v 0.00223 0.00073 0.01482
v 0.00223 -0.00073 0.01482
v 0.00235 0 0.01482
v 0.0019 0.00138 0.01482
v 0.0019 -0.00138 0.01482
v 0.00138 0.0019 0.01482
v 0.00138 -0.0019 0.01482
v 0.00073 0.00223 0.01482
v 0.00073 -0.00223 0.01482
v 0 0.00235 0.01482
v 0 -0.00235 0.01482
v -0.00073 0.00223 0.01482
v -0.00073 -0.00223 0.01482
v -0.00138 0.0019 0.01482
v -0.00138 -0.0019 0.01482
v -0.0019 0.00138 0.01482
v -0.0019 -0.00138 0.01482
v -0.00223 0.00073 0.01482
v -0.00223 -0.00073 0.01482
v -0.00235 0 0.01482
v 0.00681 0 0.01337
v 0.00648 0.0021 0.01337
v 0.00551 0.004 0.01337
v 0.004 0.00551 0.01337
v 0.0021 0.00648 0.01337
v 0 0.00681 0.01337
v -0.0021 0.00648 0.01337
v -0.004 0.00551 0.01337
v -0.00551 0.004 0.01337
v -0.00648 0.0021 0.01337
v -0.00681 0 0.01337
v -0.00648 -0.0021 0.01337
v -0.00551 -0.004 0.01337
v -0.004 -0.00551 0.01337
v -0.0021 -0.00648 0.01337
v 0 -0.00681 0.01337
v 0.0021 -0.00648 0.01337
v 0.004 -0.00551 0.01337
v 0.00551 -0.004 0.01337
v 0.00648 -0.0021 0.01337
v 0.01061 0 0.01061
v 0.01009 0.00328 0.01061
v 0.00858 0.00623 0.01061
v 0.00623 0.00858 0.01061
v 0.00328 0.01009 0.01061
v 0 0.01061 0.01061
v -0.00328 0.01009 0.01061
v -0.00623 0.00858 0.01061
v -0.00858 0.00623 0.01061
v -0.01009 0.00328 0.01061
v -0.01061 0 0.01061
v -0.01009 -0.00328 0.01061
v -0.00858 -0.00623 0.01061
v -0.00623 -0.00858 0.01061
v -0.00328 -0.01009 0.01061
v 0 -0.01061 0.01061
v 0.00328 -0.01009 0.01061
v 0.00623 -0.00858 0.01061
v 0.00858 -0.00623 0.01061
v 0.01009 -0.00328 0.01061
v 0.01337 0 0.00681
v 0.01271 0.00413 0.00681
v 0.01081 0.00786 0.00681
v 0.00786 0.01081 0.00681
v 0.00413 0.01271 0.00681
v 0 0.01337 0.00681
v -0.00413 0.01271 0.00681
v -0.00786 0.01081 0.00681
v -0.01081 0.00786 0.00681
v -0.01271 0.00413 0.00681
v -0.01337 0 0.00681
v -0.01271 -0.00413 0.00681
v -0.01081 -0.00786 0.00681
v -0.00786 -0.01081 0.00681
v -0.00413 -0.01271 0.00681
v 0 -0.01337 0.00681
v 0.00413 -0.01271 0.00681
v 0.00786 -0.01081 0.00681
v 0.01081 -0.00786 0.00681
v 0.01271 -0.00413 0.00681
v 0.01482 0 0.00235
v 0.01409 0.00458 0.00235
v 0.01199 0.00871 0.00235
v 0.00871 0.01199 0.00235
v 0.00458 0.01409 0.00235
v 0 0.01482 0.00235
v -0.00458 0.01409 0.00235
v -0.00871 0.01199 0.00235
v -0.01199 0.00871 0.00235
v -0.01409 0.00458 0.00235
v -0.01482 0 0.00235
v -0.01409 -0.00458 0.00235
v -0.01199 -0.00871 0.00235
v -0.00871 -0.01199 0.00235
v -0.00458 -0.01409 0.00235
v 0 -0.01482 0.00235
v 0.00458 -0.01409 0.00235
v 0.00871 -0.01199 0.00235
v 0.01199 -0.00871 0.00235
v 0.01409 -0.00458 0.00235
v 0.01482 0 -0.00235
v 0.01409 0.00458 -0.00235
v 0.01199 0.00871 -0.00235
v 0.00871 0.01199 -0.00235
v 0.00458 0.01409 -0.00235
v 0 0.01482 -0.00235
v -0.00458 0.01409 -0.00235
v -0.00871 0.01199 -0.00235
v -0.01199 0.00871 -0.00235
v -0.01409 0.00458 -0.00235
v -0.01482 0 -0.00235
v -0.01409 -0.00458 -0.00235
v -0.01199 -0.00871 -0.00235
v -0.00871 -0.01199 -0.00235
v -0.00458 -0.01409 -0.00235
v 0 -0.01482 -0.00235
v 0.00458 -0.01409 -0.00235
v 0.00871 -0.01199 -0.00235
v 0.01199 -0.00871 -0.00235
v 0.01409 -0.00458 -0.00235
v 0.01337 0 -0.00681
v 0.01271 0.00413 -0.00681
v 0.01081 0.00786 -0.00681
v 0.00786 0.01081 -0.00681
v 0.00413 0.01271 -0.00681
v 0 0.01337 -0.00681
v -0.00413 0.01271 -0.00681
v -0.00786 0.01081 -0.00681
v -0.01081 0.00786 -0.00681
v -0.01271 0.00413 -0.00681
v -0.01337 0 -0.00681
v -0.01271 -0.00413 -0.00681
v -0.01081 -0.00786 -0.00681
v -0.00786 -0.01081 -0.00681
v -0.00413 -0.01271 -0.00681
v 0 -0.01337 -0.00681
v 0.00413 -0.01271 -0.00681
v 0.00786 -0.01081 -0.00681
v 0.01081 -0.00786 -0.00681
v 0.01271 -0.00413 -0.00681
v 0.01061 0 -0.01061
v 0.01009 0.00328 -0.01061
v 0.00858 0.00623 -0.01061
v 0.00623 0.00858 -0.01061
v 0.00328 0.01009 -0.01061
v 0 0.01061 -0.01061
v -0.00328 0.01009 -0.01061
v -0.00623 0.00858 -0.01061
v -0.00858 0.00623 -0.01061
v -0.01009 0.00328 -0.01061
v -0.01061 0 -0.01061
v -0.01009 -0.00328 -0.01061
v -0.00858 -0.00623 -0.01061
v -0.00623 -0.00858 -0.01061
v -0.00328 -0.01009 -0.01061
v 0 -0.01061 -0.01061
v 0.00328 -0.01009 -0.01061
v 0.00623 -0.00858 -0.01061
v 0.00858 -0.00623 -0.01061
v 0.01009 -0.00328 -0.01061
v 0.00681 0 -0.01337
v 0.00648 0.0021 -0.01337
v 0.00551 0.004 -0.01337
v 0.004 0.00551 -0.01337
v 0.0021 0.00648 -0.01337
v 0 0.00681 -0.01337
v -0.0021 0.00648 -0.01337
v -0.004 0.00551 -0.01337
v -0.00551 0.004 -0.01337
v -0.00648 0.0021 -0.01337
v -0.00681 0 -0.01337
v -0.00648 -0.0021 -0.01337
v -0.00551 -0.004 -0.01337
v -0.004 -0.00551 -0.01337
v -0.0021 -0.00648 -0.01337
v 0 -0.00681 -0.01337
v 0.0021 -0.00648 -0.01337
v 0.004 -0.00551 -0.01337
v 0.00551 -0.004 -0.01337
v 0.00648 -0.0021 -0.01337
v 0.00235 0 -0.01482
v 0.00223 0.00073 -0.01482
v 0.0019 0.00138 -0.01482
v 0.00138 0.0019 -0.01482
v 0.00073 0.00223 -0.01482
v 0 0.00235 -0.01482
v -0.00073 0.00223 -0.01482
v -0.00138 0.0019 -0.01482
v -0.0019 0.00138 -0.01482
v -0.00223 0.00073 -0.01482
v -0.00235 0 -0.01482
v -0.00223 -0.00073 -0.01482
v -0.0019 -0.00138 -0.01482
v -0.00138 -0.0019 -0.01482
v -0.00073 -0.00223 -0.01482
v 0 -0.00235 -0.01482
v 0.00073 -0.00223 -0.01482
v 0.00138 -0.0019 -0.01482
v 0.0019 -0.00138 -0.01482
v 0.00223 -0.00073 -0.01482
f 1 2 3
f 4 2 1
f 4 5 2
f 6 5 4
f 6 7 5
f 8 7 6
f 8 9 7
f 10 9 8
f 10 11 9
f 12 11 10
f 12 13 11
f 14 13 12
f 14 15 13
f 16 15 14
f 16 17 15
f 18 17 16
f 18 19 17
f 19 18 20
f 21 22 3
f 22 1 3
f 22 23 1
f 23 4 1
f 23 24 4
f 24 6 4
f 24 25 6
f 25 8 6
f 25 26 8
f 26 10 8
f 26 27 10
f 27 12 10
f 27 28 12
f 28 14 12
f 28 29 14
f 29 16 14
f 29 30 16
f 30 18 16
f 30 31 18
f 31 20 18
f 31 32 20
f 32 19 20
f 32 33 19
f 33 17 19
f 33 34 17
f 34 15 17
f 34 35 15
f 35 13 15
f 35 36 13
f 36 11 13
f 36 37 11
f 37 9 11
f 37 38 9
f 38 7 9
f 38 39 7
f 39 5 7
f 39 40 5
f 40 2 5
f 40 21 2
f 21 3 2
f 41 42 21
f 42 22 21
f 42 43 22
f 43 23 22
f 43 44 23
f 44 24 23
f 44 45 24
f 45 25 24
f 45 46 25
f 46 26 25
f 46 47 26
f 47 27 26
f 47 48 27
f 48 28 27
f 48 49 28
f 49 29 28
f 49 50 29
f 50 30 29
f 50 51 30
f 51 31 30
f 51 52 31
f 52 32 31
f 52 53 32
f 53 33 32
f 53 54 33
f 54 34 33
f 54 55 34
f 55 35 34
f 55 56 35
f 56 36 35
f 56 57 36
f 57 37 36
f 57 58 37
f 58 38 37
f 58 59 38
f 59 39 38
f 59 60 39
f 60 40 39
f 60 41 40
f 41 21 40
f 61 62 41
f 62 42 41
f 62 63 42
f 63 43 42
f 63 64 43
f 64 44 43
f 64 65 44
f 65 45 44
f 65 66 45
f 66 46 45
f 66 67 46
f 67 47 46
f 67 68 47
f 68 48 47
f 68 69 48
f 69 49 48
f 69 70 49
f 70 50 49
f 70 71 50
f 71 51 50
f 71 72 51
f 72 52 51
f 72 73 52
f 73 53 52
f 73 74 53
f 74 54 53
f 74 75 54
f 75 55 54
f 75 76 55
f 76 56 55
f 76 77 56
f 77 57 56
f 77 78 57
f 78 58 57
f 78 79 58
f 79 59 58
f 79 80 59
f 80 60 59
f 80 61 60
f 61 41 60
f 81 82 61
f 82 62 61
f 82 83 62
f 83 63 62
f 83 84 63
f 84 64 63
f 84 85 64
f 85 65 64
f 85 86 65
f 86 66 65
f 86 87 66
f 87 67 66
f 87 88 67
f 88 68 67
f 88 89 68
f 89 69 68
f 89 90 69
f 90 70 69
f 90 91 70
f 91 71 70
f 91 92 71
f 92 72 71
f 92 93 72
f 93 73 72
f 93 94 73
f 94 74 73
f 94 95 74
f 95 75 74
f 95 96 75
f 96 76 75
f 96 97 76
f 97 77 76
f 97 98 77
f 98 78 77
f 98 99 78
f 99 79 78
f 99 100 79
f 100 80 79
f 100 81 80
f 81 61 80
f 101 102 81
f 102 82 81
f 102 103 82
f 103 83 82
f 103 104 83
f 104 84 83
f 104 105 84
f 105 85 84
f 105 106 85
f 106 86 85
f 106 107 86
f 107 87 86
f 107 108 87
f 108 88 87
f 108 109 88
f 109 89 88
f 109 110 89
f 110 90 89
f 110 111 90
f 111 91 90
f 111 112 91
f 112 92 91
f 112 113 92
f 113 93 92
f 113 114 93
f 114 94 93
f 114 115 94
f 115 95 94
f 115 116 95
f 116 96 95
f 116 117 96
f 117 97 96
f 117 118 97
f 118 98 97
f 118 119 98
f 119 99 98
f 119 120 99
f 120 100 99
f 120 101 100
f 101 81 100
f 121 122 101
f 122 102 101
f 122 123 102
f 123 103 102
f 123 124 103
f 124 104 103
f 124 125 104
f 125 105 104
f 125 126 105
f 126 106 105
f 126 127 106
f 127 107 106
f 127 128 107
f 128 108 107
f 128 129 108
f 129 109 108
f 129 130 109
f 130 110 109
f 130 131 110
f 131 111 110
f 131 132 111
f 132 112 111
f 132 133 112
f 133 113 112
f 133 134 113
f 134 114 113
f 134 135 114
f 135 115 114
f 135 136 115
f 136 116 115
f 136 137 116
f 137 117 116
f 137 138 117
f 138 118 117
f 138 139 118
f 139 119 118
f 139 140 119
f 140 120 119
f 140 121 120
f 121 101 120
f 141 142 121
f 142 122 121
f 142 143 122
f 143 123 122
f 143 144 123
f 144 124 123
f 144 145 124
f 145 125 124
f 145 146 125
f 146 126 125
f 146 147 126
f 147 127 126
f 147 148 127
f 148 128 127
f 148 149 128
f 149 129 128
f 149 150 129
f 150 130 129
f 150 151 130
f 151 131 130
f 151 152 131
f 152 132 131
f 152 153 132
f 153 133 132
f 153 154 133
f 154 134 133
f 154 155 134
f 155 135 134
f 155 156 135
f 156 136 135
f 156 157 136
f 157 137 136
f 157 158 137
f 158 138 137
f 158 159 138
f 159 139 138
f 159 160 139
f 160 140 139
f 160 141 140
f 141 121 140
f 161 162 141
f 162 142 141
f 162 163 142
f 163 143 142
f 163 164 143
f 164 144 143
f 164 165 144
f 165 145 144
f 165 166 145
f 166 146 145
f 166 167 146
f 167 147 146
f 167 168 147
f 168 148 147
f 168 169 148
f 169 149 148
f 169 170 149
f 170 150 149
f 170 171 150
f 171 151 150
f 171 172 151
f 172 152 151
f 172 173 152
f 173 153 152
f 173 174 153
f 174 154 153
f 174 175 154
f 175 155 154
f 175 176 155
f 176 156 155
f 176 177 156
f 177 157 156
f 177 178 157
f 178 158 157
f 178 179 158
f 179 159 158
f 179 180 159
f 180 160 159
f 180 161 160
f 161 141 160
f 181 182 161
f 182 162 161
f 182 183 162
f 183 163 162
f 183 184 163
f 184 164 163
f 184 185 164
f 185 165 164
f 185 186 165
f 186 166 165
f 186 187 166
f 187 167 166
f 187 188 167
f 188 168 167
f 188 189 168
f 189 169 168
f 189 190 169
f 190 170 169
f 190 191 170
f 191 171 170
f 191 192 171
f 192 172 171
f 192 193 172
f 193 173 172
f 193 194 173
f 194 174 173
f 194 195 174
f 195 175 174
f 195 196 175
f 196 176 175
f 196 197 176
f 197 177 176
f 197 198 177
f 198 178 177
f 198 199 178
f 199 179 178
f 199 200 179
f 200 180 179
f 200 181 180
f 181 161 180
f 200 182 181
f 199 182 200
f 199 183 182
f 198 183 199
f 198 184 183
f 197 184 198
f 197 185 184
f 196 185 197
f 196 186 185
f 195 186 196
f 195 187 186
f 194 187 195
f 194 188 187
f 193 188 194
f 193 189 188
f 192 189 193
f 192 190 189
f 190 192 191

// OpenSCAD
// Auto-generated extrusion assembly
$fn = 20;


module extrusion_2020(length) {
  // 20mm x 20mm extrusion, colored faces
  translate([0, 0, length/2])
  difference() {
    cube([0.02, 0.02, length], center=true);
    // Hollow out slightly for visual effect
    cube([0.016, 0.016, length+0.001], center=true);
  }
}

module colored_extrusion(start, end, white_dir) {
  // Calculate direction and length
  dir = end - start;
  len = norm(dir);
  
  // Calculate rotation to align Z with direction
  if (len > 0.001) {
    translate(start)
    multmatrix(m=look_at(dir, white_dir))
    extrusion_2020(len);
  }
}

// Look-at matrix helper
function look_at(dir, up) = 
  let(
    z = dir / norm(dir),
    x = cross(up, z) / norm(cross(up, z)),
    y = cross(z, x)
  )
  [[x[0], y[0], z[0], 0],
   [x[1], y[1], z[1], 0],
   [x[2], y[2], z[2], 0],
   [0, 0, 0, 1]];


module connector(pos) {
  translate(pos)
  color([0.3, 0.3, 0.3])
  sphere(r=0.015);
}

connector([0.000000, 0.000000, 0.000000]);
